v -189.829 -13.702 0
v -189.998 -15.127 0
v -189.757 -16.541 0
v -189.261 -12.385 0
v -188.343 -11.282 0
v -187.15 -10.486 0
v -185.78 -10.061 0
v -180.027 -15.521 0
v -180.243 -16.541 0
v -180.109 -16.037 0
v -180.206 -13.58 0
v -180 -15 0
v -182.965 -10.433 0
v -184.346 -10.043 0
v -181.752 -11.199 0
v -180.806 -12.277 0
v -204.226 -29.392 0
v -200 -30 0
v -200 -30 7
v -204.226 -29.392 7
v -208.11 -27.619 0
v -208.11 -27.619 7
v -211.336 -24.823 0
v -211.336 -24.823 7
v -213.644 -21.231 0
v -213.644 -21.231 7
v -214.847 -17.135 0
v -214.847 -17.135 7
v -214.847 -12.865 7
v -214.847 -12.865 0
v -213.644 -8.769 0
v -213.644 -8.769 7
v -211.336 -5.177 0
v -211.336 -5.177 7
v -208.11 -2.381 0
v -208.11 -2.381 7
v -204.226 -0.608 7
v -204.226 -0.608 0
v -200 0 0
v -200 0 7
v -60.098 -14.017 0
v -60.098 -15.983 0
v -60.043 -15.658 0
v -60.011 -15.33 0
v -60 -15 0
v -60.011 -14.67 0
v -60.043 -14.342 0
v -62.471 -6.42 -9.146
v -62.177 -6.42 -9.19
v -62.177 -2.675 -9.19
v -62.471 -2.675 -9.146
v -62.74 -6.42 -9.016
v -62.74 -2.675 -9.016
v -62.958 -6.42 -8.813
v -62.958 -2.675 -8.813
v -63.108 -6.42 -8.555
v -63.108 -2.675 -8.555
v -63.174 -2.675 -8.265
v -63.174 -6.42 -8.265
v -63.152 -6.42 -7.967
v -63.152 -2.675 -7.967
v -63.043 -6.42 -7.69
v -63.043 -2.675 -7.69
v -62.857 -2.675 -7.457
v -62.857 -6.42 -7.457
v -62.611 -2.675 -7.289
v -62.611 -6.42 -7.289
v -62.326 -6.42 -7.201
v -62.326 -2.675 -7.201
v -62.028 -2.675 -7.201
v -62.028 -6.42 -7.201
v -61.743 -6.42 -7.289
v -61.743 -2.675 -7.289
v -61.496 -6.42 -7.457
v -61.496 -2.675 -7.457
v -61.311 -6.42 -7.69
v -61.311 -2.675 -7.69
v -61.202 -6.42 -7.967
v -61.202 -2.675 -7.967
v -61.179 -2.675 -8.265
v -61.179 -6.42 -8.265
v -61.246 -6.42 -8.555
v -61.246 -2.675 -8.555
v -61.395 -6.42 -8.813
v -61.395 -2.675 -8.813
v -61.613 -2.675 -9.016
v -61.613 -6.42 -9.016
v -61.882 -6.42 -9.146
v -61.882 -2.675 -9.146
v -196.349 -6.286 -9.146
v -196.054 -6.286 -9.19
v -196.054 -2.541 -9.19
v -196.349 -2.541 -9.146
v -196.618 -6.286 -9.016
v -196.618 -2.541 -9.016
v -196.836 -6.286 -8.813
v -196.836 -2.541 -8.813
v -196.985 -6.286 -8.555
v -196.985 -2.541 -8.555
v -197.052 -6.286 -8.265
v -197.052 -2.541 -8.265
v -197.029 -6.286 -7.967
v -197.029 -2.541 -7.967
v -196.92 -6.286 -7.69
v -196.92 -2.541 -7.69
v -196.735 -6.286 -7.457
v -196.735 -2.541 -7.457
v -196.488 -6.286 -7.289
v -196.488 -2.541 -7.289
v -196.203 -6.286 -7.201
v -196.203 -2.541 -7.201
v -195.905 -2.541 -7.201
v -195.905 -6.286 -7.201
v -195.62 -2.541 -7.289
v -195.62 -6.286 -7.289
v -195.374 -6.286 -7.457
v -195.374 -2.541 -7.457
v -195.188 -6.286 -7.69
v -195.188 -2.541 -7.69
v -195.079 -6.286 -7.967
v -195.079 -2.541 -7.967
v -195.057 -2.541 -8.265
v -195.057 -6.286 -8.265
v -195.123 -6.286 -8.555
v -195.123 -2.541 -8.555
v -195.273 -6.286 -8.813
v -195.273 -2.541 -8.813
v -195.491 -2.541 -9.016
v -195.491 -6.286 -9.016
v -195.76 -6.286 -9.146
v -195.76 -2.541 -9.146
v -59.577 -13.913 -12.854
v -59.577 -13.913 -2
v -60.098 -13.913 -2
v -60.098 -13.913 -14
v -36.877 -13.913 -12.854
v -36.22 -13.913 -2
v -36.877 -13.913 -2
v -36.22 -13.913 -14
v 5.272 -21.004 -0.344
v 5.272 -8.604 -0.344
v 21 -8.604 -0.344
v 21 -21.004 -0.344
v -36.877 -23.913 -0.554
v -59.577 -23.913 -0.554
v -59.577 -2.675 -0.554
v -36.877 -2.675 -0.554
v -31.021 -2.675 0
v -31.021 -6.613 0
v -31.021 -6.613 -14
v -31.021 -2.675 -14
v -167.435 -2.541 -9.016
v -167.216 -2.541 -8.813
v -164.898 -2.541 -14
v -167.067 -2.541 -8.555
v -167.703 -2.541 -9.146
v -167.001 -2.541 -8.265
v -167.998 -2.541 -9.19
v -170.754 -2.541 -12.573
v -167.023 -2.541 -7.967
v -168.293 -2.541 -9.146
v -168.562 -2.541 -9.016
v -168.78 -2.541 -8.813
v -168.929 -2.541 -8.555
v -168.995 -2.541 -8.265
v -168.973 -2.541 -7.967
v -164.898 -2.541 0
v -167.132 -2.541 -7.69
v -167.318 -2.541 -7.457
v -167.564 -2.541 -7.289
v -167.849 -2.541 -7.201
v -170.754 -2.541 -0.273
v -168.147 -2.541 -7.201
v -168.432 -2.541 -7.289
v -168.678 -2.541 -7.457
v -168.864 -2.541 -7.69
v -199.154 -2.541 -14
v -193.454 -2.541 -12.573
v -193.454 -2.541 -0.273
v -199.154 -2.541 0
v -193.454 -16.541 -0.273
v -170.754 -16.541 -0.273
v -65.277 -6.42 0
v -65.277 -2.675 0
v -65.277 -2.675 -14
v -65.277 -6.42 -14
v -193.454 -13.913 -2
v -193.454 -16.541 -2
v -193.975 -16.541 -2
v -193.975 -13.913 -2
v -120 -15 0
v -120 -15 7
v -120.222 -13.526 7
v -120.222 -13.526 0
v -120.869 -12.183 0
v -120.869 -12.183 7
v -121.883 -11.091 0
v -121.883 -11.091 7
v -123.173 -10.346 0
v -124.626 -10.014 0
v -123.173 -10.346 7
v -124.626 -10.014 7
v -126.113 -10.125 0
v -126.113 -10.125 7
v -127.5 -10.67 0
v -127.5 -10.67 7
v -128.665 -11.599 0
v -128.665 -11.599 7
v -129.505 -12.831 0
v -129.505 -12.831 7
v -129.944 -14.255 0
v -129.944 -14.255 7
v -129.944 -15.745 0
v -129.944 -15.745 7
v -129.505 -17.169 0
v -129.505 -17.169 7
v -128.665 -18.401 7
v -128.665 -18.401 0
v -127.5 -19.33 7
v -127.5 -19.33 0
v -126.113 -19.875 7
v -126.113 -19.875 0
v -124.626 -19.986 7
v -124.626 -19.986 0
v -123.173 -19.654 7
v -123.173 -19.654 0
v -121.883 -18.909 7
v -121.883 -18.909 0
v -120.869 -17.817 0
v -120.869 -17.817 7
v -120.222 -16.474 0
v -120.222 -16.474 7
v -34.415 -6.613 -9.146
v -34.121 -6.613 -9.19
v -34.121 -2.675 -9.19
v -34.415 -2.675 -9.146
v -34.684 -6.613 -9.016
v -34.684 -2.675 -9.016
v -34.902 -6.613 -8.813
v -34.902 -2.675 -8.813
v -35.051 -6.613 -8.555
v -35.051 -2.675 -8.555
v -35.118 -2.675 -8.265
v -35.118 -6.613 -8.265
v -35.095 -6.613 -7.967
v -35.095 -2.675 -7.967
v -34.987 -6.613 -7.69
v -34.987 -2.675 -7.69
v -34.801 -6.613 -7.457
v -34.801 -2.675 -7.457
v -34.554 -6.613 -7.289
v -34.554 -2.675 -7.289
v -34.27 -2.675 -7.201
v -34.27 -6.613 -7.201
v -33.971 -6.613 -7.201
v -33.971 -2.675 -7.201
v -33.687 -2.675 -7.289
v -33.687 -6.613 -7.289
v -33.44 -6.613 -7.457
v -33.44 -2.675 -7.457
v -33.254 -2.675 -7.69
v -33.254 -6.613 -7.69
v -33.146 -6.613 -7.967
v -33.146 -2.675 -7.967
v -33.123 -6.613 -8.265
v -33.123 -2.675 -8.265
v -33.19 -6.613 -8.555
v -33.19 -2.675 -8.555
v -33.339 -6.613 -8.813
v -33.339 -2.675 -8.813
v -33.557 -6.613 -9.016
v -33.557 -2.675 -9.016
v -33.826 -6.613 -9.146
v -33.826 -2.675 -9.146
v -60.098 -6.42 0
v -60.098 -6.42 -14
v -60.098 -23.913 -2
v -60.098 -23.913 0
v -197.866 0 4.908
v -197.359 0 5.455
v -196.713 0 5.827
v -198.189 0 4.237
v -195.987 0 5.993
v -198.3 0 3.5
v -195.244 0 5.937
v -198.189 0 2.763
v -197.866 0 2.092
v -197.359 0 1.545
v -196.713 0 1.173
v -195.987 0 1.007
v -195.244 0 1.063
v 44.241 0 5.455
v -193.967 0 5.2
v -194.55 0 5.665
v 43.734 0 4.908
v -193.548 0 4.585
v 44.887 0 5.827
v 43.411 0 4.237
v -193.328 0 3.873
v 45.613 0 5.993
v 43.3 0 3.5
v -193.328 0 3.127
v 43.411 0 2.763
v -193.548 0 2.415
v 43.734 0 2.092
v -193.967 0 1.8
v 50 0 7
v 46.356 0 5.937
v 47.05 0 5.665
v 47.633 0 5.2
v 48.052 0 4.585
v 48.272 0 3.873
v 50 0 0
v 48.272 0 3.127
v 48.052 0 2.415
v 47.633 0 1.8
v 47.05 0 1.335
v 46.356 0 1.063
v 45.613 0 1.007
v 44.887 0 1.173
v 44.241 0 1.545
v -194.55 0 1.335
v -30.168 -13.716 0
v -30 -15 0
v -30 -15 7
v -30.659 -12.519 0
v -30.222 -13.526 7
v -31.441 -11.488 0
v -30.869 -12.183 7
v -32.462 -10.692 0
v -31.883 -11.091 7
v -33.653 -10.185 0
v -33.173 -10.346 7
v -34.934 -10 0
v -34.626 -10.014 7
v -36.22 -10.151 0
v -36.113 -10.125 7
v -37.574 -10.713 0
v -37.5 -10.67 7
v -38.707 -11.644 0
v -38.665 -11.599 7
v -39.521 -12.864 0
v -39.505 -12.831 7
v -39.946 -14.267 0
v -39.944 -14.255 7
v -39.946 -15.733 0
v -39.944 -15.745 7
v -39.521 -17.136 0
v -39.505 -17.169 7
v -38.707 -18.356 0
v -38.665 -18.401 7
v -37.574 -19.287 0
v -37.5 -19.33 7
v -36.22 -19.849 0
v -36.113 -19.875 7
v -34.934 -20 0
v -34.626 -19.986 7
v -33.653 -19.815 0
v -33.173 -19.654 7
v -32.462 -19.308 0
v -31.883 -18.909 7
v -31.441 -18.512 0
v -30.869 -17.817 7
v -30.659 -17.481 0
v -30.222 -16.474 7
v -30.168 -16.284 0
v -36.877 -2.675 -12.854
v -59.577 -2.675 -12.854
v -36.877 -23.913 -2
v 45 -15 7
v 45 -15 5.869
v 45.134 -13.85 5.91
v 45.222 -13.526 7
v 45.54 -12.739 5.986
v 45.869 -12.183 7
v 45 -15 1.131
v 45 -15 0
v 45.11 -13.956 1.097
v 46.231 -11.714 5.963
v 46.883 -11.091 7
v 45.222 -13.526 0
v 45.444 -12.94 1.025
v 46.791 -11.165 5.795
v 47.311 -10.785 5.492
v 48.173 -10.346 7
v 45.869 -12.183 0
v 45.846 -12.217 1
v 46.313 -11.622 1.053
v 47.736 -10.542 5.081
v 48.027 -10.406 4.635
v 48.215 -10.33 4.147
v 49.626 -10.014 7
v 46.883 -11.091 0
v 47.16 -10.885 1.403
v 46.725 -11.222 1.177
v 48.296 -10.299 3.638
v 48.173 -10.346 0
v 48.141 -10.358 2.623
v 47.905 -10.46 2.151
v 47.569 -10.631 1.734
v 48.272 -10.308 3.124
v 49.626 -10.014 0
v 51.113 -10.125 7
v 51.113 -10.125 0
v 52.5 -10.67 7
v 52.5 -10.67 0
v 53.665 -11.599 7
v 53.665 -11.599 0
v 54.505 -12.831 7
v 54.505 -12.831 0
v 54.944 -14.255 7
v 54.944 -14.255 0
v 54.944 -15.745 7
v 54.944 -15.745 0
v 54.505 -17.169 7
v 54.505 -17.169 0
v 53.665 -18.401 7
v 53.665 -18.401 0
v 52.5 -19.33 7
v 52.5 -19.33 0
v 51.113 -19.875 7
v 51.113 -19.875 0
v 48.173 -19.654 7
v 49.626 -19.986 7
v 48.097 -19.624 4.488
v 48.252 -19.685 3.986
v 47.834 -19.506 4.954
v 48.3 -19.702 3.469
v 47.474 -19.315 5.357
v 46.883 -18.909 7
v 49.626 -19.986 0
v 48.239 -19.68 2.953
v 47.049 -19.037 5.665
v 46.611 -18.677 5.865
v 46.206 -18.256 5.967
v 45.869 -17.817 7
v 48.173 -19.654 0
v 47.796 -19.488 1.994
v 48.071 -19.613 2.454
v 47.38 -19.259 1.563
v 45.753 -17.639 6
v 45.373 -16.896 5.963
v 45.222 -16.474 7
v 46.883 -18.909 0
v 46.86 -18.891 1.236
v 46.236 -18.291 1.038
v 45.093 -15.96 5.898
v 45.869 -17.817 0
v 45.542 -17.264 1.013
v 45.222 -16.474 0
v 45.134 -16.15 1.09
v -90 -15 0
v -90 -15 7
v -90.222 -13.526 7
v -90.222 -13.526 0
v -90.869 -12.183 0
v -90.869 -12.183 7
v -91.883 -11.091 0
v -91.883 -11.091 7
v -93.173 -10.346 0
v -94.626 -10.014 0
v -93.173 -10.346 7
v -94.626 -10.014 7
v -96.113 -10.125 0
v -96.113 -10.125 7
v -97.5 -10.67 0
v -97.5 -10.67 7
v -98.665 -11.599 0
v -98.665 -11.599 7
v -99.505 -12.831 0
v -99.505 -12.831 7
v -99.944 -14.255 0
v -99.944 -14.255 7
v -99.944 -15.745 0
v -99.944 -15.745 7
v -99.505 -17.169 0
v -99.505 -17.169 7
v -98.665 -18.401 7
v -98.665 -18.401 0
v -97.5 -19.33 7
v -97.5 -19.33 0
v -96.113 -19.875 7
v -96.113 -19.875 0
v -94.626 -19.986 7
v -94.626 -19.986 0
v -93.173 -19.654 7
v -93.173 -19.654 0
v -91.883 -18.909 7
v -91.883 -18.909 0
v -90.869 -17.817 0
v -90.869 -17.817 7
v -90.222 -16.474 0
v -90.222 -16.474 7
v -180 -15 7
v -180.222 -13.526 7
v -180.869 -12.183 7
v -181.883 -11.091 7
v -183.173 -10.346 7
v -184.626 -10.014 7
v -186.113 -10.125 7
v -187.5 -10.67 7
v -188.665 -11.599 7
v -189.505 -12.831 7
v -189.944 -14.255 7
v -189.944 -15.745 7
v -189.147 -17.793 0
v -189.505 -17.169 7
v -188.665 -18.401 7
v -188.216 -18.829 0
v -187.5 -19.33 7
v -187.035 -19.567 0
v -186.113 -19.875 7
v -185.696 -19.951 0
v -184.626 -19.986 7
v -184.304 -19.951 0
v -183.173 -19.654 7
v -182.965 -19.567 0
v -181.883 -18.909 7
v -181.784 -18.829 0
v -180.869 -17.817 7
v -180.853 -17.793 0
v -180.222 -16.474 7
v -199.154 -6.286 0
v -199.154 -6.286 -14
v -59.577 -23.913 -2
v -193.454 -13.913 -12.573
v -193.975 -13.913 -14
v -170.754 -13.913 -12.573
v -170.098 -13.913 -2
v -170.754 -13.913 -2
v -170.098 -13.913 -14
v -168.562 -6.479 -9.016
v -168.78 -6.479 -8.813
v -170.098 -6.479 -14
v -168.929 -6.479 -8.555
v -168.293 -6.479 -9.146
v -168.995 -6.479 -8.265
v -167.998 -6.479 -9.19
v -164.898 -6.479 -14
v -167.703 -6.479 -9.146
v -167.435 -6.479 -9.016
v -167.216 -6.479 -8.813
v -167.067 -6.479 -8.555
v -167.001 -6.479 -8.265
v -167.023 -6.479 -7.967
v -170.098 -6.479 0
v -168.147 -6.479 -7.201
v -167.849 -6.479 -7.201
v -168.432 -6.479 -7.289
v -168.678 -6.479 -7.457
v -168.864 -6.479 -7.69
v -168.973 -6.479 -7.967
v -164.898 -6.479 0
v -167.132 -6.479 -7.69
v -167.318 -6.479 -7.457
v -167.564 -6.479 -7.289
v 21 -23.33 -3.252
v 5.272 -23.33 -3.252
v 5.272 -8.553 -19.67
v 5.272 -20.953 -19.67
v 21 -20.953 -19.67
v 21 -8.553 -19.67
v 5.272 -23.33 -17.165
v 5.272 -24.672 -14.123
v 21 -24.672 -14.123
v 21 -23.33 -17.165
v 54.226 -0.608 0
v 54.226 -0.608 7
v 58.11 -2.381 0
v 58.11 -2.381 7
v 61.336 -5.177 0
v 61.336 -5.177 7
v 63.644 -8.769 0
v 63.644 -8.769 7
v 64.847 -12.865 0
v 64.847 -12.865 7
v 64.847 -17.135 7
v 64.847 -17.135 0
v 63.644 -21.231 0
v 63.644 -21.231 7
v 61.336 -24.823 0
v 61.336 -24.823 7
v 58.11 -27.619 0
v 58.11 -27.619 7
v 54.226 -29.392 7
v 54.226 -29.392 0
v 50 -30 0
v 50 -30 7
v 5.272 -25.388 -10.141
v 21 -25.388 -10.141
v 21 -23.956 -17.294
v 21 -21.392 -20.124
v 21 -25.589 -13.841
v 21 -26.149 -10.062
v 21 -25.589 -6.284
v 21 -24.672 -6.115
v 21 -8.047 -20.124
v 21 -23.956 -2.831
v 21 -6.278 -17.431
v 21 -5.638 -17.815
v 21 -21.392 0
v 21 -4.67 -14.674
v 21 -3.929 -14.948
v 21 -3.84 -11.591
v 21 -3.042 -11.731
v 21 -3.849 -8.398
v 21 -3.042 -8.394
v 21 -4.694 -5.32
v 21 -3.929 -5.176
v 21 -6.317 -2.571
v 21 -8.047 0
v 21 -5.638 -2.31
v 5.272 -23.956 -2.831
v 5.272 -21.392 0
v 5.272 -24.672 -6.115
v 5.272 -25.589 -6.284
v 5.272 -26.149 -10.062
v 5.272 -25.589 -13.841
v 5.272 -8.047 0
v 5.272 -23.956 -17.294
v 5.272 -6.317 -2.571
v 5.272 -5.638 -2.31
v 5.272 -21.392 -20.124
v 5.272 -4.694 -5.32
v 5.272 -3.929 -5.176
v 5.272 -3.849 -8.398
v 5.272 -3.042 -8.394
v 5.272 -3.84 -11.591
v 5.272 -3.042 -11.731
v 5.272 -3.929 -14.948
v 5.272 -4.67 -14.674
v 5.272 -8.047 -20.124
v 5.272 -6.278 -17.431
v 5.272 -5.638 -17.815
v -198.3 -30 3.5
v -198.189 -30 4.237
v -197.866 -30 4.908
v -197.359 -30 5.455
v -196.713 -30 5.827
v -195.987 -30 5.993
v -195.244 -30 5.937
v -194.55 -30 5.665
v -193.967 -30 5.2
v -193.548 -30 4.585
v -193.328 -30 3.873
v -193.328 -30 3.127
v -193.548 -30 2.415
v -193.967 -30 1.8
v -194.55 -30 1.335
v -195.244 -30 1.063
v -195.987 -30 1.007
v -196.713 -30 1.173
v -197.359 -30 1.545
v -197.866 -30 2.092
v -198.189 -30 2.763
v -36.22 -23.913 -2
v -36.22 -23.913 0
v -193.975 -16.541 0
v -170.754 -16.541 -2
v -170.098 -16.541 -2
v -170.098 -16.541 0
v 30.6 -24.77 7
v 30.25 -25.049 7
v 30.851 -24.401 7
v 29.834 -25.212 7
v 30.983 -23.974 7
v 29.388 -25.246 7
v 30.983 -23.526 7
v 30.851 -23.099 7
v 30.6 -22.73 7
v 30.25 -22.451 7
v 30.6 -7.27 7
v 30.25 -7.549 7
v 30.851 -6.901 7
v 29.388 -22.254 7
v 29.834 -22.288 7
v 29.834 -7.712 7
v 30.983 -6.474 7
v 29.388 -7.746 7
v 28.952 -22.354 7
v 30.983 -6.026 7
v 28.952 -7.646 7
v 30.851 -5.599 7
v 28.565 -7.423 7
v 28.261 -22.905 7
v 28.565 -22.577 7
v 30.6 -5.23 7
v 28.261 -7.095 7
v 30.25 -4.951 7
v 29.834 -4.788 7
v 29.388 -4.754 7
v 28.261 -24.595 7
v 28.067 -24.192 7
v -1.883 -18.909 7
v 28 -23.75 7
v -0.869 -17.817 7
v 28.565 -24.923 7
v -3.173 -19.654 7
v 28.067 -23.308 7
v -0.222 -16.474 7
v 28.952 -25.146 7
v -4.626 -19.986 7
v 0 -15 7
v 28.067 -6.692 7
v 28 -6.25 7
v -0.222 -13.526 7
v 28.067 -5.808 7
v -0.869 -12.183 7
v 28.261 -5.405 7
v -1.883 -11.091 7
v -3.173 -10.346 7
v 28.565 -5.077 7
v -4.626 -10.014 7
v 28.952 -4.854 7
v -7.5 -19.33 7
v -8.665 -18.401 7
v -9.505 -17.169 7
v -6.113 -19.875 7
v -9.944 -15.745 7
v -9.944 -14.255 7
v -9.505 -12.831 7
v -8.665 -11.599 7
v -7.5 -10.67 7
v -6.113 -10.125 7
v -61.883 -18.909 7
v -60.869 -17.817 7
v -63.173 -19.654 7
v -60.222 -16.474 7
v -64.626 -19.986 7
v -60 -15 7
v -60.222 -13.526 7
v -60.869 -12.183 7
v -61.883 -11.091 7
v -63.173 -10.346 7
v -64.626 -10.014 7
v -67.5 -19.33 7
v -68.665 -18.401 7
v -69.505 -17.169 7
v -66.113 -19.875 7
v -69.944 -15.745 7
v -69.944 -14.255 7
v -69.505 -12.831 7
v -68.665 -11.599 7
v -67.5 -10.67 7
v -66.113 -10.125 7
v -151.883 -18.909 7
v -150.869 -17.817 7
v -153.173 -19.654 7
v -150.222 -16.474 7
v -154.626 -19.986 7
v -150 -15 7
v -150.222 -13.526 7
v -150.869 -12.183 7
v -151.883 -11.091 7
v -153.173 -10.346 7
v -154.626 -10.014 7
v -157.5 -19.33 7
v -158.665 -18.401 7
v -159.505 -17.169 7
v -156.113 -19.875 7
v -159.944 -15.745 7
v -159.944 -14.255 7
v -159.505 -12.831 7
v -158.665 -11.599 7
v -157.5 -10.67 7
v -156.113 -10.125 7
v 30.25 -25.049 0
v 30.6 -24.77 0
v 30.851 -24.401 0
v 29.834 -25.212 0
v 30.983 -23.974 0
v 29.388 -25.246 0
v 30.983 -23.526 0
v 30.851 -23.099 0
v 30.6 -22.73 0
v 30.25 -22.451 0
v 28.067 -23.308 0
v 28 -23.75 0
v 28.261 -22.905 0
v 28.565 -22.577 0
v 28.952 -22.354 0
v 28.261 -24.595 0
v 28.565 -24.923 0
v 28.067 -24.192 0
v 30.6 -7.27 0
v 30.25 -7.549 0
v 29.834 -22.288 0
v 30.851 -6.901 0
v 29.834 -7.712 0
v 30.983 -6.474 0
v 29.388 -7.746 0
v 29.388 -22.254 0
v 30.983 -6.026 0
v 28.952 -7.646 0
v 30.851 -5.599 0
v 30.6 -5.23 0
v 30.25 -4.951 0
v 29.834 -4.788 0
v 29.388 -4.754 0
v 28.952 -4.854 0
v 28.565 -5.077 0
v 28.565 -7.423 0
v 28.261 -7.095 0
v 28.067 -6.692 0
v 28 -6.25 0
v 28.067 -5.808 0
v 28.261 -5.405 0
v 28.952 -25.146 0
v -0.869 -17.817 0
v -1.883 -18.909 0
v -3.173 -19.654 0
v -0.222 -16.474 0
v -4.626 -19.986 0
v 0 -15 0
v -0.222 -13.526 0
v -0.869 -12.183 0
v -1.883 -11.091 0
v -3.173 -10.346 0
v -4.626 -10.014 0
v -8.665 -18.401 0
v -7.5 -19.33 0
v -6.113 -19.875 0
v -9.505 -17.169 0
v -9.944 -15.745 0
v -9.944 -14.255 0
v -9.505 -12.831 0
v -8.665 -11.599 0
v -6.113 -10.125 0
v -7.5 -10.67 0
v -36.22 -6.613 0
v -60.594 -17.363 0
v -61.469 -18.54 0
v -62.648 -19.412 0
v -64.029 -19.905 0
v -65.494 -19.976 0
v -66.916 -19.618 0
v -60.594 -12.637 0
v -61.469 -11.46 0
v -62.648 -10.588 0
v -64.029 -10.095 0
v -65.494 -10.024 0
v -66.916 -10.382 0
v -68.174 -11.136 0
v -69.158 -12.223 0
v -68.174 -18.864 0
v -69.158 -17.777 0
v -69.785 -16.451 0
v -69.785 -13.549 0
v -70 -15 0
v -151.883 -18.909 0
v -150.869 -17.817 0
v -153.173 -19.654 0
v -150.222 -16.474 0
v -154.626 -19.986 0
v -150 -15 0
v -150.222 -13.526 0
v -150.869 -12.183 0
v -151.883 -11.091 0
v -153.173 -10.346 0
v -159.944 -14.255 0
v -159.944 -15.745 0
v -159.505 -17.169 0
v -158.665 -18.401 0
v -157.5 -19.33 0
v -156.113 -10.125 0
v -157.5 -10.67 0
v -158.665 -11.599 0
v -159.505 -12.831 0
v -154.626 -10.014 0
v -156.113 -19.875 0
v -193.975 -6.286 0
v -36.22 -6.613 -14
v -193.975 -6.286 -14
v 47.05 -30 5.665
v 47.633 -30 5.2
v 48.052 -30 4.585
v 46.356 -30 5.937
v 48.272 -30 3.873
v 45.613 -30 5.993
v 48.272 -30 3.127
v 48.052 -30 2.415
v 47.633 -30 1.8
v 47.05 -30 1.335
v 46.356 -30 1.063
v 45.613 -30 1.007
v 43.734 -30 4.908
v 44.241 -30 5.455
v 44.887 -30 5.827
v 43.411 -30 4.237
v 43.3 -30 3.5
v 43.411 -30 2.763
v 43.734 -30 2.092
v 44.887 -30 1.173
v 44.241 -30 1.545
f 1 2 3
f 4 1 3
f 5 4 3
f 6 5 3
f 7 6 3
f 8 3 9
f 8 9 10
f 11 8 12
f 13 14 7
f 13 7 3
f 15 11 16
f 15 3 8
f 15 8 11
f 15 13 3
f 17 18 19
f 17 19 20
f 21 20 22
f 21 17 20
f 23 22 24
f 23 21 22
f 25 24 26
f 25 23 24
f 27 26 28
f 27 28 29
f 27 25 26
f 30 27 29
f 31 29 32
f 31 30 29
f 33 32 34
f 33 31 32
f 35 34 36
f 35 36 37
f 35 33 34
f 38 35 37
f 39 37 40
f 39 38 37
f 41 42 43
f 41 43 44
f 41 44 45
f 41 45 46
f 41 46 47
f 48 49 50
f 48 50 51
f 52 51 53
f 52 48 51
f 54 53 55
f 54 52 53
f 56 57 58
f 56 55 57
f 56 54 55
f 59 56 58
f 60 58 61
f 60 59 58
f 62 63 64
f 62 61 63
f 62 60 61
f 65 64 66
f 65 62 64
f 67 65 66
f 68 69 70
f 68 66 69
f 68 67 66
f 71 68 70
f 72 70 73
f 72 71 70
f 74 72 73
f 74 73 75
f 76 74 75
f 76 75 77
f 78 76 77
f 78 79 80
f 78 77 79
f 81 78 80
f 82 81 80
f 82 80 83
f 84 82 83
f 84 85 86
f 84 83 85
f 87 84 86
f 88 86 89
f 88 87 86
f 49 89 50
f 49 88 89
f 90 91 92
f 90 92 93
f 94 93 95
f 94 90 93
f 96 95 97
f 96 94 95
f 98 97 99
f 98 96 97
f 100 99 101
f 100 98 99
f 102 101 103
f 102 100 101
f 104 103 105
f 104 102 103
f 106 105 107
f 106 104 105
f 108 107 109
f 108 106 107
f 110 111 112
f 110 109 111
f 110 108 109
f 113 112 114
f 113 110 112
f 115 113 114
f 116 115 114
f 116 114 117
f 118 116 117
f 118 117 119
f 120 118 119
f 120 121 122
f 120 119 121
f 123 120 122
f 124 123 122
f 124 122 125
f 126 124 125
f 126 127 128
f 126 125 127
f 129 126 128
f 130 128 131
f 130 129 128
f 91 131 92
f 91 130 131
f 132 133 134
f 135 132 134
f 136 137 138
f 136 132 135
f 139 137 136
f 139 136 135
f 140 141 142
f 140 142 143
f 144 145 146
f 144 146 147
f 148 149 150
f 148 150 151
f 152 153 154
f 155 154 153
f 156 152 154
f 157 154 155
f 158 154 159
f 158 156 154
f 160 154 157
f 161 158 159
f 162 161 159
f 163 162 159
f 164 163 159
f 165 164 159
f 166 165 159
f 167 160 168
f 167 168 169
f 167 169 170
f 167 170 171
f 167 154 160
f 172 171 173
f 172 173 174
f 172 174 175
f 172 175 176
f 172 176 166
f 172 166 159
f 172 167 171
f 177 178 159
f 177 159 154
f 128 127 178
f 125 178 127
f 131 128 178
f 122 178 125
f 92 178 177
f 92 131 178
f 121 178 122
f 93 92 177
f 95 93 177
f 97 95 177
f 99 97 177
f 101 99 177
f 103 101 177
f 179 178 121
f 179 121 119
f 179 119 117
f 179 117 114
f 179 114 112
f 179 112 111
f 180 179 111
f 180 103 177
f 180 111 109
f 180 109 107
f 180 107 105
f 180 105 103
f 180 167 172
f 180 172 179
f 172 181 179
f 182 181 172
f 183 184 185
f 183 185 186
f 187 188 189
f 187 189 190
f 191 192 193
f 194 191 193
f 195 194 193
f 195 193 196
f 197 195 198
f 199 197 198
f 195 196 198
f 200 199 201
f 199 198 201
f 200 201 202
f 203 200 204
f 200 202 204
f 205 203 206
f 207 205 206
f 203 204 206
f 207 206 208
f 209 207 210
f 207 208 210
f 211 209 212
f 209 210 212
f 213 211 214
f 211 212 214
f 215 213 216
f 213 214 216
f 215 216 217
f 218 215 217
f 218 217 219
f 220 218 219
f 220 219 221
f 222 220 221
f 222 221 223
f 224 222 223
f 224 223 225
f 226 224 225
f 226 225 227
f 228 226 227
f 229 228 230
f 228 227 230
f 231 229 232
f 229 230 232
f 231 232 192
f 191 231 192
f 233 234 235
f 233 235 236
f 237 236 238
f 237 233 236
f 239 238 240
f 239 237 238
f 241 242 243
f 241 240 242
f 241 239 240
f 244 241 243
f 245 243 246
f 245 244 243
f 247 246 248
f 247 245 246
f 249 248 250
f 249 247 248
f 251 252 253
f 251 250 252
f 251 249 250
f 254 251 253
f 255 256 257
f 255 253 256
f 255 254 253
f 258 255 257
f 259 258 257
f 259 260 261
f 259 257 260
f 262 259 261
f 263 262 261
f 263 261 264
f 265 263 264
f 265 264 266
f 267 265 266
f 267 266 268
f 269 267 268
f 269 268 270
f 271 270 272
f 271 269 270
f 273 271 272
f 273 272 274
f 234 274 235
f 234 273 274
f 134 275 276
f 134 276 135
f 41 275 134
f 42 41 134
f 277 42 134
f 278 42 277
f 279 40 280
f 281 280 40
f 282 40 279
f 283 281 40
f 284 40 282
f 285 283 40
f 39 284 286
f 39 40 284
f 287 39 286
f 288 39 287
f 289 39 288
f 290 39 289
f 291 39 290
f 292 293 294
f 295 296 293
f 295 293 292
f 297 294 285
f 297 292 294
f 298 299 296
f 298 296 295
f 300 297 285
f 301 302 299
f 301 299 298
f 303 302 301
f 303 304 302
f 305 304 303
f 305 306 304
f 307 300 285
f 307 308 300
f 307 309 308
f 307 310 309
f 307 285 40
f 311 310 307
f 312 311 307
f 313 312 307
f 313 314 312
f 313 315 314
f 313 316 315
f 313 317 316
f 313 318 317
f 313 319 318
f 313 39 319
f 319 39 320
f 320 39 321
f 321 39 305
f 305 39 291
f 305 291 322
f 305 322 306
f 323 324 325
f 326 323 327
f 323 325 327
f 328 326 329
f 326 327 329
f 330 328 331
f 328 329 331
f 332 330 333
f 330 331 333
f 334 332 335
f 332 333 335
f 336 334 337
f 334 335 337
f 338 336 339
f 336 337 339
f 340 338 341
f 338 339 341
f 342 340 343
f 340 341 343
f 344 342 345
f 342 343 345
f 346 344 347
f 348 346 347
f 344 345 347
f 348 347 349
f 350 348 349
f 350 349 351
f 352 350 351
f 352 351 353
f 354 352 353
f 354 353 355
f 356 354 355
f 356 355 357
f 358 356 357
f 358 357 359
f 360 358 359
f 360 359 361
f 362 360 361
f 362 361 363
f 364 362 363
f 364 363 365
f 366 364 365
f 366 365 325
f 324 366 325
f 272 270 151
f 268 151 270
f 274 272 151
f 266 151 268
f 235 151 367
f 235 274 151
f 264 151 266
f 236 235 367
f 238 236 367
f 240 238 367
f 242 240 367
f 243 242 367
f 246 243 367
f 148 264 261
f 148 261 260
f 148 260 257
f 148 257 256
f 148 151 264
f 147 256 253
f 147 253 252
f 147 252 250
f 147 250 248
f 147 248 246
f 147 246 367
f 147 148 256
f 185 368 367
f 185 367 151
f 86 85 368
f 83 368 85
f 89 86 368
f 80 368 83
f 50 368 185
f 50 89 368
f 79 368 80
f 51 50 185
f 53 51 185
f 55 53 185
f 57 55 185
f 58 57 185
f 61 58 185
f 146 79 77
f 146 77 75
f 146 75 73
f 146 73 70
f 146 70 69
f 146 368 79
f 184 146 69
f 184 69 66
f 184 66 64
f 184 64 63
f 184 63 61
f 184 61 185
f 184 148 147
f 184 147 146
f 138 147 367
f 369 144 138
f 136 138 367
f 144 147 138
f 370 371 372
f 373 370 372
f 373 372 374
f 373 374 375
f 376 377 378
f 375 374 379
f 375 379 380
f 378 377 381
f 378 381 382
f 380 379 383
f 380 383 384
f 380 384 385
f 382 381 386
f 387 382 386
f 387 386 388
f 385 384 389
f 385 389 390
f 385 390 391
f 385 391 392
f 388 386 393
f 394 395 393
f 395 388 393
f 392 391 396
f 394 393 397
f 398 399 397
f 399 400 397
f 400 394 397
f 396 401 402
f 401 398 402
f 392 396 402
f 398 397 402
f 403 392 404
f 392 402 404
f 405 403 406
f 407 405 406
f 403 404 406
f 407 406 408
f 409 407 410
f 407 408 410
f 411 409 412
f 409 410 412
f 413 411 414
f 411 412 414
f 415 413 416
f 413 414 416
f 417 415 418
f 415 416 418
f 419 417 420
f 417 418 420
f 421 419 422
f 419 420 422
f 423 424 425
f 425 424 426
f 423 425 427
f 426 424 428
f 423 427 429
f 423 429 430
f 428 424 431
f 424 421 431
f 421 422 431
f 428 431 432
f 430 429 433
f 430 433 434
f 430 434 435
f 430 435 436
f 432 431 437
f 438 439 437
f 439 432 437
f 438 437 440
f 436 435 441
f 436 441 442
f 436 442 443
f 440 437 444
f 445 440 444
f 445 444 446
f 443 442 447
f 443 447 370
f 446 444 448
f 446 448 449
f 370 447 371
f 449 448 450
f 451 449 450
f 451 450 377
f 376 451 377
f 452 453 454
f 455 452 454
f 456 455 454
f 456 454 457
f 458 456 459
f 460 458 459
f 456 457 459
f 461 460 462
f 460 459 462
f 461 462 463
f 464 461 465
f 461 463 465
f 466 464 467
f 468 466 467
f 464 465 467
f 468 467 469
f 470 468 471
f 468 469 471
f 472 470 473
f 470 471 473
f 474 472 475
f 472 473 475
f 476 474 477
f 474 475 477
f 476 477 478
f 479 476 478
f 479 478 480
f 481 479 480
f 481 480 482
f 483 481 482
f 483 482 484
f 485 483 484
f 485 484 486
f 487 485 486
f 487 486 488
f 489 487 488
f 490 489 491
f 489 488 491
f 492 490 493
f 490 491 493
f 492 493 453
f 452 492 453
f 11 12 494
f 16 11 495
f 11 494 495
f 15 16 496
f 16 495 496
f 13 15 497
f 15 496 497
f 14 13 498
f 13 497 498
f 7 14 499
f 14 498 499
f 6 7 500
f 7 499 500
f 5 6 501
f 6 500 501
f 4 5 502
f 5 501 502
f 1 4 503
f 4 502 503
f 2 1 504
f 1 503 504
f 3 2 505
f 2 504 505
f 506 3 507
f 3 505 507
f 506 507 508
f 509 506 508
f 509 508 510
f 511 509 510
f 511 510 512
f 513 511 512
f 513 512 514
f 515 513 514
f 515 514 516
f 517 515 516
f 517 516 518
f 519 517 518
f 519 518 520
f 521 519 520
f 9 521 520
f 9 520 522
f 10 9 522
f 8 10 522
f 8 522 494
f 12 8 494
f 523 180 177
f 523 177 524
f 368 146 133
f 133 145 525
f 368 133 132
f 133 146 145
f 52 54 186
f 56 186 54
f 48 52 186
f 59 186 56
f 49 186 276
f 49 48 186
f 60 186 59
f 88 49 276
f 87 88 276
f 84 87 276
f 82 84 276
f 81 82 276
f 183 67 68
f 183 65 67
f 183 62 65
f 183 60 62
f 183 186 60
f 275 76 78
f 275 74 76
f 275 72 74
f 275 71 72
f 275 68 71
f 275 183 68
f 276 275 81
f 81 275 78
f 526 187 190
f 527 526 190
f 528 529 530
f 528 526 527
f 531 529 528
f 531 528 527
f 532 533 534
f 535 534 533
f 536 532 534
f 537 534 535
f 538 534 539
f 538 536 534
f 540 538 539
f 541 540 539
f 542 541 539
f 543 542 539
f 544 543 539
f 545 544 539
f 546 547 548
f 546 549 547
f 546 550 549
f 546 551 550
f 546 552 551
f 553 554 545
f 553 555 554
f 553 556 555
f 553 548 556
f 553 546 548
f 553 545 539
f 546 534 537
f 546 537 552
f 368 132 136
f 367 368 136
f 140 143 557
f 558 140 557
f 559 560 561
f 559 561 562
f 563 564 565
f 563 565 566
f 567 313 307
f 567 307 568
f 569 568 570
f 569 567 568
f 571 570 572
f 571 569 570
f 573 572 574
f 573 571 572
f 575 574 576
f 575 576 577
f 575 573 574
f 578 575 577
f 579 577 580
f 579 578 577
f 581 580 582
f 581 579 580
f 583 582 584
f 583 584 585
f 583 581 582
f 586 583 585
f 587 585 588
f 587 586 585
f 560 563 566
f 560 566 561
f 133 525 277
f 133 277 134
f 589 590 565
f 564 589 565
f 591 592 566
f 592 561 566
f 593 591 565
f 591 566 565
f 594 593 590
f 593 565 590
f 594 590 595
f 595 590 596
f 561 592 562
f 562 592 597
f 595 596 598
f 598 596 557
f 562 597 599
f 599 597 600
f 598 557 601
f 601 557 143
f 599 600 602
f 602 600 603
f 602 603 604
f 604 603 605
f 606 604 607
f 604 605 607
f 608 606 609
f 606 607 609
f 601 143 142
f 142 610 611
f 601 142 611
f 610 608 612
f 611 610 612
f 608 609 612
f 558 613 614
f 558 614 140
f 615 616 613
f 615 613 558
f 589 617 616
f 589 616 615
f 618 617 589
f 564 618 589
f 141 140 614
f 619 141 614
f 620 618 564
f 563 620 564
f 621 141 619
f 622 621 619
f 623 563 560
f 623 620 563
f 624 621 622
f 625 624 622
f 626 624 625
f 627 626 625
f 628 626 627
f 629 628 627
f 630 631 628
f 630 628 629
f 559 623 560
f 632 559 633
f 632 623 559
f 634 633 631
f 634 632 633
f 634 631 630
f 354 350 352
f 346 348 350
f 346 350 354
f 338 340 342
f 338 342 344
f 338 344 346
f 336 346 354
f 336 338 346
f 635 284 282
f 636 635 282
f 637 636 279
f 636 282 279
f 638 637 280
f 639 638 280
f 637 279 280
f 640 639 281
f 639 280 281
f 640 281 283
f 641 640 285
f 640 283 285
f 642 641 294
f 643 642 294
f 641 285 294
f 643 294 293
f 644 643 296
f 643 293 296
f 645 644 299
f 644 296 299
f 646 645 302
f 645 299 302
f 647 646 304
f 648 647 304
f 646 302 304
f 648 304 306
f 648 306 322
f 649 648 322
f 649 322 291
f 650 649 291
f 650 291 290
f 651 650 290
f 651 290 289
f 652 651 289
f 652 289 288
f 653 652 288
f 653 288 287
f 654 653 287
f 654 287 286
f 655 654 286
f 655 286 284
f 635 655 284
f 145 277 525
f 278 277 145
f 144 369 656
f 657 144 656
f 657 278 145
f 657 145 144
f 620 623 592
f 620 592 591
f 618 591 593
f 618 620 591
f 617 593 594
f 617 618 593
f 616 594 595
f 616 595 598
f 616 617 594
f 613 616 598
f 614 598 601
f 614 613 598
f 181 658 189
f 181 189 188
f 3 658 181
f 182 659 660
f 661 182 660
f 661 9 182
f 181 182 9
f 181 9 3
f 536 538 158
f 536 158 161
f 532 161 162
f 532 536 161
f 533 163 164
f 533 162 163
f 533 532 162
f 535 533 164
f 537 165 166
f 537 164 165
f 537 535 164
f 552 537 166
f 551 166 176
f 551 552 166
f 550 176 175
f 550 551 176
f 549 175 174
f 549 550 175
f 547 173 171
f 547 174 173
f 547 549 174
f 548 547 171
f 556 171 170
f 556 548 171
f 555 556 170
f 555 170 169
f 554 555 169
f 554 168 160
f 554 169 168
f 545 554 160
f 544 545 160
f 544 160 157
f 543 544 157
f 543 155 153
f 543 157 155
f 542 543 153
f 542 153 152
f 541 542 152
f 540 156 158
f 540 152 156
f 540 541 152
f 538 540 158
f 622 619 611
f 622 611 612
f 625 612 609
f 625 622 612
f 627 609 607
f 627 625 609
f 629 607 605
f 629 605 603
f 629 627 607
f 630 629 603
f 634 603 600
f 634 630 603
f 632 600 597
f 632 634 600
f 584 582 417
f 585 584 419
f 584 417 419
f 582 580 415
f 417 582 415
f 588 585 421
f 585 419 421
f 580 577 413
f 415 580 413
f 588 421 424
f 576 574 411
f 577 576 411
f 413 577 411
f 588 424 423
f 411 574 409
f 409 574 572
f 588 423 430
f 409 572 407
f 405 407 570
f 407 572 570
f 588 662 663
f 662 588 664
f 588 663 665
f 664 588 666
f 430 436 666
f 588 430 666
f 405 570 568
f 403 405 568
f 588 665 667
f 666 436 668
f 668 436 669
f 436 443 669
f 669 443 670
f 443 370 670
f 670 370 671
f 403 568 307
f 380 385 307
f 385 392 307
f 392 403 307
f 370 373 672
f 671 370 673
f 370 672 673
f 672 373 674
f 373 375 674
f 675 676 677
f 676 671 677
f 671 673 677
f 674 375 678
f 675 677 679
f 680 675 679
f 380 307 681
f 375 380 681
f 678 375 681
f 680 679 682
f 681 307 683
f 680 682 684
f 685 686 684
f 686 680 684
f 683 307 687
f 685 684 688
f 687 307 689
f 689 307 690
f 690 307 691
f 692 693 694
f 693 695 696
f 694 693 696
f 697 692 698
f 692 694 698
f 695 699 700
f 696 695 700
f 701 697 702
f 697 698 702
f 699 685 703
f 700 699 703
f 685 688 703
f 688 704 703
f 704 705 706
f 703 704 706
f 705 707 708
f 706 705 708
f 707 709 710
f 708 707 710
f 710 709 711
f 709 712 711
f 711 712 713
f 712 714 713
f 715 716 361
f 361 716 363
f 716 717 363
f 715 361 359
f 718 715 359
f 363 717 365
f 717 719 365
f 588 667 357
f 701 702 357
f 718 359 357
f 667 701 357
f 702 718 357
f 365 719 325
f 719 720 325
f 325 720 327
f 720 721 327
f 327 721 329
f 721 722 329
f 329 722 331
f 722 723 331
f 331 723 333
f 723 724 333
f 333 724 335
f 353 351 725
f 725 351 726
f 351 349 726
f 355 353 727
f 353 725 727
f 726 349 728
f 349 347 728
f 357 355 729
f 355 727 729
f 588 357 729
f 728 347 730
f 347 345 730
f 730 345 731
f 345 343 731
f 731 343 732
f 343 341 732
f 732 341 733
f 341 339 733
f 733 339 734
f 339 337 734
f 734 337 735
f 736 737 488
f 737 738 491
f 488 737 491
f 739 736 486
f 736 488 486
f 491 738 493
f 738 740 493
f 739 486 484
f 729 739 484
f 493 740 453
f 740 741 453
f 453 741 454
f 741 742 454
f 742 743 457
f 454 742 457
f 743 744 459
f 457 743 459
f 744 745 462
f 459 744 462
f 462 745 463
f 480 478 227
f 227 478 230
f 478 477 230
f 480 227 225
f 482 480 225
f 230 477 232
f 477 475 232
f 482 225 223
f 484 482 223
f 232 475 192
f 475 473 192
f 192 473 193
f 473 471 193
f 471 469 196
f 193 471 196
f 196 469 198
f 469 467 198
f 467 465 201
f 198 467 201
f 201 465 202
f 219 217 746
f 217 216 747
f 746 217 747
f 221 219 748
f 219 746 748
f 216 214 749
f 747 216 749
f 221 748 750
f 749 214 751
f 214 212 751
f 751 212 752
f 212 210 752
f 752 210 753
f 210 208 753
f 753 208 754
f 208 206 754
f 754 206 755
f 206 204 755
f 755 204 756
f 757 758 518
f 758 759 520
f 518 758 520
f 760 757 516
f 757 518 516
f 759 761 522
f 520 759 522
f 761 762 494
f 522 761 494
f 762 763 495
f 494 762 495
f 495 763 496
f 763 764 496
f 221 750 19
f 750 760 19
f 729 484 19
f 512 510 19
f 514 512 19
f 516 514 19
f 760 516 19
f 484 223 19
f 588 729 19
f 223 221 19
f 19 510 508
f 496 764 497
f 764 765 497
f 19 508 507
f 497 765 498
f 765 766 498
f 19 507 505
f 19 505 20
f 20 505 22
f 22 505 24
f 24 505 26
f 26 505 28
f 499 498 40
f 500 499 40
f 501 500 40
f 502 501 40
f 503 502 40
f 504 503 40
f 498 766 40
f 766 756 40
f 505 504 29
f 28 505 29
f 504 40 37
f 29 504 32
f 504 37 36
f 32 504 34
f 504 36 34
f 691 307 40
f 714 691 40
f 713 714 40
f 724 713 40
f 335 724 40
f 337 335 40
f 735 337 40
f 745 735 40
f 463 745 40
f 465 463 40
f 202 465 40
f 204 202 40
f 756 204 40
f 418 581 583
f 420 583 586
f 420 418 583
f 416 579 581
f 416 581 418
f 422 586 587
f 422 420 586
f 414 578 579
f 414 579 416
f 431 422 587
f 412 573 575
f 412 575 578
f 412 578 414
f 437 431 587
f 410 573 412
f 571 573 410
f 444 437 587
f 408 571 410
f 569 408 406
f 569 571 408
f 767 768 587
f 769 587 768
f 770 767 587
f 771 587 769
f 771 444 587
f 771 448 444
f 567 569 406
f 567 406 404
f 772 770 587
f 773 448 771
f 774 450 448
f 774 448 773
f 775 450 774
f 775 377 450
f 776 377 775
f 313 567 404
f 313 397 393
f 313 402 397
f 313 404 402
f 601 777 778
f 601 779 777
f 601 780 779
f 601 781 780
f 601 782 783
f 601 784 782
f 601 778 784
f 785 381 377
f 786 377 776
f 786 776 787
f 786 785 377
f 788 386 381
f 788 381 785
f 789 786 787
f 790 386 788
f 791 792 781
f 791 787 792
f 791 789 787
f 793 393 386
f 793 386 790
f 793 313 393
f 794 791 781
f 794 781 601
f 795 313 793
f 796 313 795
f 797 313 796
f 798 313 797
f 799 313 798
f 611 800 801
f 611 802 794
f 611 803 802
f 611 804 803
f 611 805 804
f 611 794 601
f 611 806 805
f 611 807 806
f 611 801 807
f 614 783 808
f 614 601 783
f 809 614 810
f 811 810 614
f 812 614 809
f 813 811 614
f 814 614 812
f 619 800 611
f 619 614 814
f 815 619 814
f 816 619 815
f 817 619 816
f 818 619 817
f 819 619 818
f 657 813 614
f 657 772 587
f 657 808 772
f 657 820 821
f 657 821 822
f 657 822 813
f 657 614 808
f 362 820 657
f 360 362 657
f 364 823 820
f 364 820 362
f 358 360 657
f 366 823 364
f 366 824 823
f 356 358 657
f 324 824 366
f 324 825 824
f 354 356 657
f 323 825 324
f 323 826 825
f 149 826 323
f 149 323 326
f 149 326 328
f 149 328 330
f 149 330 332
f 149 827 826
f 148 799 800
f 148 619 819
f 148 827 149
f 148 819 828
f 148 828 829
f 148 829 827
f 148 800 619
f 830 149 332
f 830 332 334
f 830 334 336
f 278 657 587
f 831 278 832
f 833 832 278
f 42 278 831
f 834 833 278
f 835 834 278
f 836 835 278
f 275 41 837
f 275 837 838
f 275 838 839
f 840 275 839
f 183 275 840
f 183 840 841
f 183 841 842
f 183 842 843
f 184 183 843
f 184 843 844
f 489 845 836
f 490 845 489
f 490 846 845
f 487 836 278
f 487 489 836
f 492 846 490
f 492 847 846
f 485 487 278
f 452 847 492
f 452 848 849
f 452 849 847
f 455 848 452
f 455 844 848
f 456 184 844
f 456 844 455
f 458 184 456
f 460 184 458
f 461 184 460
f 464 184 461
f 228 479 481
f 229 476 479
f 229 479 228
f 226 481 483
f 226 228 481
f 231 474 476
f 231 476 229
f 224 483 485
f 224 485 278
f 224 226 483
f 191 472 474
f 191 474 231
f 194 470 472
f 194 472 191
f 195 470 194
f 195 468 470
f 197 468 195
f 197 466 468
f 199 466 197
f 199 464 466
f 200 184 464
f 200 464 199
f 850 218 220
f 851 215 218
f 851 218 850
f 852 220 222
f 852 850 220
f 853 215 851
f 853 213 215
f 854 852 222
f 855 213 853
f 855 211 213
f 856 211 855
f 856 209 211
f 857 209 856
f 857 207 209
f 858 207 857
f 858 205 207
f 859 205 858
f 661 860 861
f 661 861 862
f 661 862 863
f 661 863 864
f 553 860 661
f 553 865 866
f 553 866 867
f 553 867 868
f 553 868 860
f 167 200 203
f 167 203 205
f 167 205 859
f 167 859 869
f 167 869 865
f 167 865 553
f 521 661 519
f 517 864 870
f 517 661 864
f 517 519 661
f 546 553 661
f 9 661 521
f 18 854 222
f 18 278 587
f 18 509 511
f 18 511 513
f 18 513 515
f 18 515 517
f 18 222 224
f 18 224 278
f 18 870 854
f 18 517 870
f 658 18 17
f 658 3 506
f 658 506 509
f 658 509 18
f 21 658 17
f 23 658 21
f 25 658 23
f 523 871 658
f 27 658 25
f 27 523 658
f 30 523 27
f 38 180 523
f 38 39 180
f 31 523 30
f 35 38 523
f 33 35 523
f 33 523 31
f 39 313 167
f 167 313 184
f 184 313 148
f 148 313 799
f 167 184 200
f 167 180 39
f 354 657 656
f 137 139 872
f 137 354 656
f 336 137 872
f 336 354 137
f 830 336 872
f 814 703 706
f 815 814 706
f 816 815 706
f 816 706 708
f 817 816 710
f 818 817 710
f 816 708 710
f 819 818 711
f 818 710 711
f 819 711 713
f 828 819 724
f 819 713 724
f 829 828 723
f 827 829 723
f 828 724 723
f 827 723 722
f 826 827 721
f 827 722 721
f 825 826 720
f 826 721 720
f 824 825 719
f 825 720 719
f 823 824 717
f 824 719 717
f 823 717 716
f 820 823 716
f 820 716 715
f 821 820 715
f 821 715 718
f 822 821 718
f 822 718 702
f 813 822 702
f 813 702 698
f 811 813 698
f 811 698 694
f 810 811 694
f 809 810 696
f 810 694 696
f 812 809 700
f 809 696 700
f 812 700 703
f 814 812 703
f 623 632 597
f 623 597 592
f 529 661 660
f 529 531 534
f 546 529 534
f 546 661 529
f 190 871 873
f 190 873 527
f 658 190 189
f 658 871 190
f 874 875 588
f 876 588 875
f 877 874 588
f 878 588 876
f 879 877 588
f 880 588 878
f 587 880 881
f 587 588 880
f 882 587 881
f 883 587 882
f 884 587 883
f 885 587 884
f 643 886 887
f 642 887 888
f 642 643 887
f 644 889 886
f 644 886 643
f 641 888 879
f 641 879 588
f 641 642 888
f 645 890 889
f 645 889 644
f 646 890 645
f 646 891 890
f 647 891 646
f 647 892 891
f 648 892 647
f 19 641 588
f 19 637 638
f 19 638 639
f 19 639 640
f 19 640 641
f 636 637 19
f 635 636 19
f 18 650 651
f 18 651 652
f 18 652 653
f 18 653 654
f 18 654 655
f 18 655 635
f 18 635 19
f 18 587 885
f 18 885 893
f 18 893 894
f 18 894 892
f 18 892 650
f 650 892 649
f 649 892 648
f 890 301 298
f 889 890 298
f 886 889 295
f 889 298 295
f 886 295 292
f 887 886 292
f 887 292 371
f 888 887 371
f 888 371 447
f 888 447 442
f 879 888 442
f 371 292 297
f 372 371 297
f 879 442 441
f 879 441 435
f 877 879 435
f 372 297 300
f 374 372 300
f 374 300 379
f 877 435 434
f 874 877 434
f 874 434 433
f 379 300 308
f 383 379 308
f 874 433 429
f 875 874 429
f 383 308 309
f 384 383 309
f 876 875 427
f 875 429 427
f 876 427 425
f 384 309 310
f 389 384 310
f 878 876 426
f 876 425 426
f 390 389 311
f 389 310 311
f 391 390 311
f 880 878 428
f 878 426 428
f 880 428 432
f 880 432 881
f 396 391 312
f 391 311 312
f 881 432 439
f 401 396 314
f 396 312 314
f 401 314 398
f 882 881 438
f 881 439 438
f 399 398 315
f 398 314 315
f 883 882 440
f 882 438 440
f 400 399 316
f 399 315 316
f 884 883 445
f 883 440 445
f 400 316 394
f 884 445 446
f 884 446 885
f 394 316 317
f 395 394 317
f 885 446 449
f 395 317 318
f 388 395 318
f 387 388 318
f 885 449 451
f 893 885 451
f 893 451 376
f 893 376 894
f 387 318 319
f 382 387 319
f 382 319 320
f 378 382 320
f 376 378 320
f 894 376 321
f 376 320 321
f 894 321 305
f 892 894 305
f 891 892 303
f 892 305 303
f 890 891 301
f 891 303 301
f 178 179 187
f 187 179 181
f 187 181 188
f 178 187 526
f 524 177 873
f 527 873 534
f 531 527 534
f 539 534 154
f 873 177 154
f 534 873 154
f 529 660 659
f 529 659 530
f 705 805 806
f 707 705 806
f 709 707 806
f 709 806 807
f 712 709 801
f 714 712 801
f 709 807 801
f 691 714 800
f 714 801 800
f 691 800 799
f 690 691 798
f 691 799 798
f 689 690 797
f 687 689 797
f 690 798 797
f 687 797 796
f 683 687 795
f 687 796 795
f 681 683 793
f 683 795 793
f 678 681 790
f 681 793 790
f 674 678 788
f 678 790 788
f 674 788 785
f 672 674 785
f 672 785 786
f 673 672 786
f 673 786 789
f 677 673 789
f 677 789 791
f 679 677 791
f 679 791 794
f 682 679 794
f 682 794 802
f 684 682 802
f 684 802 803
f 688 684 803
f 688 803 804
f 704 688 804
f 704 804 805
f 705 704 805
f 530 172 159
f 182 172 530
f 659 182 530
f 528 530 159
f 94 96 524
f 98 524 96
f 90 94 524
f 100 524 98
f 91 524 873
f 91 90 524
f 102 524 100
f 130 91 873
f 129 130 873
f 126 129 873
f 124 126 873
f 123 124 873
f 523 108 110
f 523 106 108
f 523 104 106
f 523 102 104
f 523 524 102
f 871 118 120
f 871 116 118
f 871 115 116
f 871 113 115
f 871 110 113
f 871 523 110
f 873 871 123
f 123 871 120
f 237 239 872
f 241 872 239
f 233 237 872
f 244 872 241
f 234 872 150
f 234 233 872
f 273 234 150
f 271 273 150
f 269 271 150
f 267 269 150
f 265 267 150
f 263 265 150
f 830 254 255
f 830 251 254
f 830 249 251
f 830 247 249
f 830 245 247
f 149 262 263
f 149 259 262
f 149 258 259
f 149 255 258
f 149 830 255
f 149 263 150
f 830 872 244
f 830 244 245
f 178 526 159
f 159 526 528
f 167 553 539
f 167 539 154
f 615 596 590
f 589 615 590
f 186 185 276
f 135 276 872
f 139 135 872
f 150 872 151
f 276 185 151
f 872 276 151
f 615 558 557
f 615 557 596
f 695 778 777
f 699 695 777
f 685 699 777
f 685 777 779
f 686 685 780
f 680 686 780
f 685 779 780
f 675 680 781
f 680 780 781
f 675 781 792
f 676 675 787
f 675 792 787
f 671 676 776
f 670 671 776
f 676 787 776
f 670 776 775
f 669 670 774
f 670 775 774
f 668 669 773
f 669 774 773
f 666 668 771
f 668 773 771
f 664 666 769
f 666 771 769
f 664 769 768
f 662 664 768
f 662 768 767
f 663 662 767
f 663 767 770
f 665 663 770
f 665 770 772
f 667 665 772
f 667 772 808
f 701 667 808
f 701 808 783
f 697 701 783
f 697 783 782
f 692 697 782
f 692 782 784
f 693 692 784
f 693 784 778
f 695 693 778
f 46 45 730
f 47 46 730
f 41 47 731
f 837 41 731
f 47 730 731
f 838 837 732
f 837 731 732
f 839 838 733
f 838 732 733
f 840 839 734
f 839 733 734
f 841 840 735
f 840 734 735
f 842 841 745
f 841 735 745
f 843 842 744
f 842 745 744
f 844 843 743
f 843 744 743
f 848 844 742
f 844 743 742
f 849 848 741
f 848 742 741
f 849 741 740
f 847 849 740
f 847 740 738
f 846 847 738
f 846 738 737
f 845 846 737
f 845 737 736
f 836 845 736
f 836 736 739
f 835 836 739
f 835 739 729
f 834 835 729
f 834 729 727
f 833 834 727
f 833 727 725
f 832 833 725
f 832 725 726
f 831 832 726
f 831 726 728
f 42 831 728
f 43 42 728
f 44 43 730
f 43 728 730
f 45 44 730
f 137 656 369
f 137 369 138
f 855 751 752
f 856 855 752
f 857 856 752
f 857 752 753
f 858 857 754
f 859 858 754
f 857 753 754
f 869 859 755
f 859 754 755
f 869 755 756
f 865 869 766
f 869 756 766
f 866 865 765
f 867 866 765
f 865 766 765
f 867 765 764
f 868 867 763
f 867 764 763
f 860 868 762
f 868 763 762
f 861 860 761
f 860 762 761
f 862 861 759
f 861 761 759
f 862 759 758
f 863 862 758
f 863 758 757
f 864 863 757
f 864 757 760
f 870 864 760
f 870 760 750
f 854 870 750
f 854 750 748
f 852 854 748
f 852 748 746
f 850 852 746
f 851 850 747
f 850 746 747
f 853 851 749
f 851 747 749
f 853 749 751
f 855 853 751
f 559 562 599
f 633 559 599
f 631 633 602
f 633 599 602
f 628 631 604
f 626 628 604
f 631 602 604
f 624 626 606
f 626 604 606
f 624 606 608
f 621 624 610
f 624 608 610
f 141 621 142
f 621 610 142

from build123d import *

# Parameters (mm, degrees)
BOSS_EXTRUDE1_DEPTH     = 7
SKETCH2_R               = 5
CUT_EXTRUDE1_DEPTH      = 7
LPATTERN1_COUNT         = 7
LPATTERN1_PITCH         = 30
SKETCH6_R               = 5
CUT_EXTRUDE2_DEPTH      = 10
BOSS_EXTRUDE2_DEPTH     = 21
CUT_EXTRUDE3_DEPTH      = 21
CUT_EXTRUDE4_REACH      = 220.014
SKETCH9_R               = 1.5
CUT_EXTRUDE5_REACH      = 220.771
SKETCH10_W              = 5.271518542
SKETCH10_H              = 23.219312301
BOSS_EXTRUDE3_DEPTH     = 14
CUT_EXTRUDE6_DEPTH      = 1
CUT_EXTRUDE6_DEPTH_BACK = 22
SKETCH12_W              = 22.7
SKETCH12_H              = 12.3
CUT_EXTRUDE7_DEPTH      = 7
CUT_EXTRUDE7_DEPTH_BACK = 7
SKETCH13_R              = 1
CUT_EXTRUDE8_REACH      = 184.393
SKETCH14_W              = 12
SKETCH14_H              = 10
CUT_EXTRUDE9_REACH      = 220.014
SKETCH15_R              = 2.5


with BuildPart() as part:
    # Sketch1 → Boss-Extrude1 (new body)
    with BuildSketch(Plane.XY):
        with BuildLine():
            Line((-200, 0), (50, 0))
            ThreePointArc((50, 0), (65, -15), (50, -30))
            Line((50, -30), (-200, -30))
            ThreePointArc((-200, -30), (-215, -15), (-200, 0))
        make_face()
    extrude(amount=BOSS_EXTRUDE1_DEPTH)

    # Sketch2 → Cut-Extrude1 (cut)
    with BuildSketch(Plane.XY.offset(7)):
        with Locations((-185, -15)):
            Circle(SKETCH2_R)
    cut_extrude1 = extrude(amount=-CUT_EXTRUDE1_DEPTH, mode=Mode.SUBTRACT)

    # LPattern1: Cut-Extrude1 ×7
    with Locations(*[(i * LPATTERN1_PITCH, 0, 0) for i in range(1, LPATTERN1_COUNT)]):
        add(cut_extrude1, mode=Mode.SUBTRACT)

    # Sketch6 → Cut-Extrude2 (cut)
    with BuildSketch(Plane(origin=(0, 0, 0), x_dir=(-1, 0, 0), z_dir=(0, 0, -1))):
        with Locations((-50, -15)):
            Circle(SKETCH6_R)
    extrude(amount=-CUT_EXTRUDE2_DEPTH, mode=Mode.SUBTRACT)

    # Sketch7 → Boss-Extrude2 (add)
    with BuildSketch(Plane(origin=(0, 0, 0), x_dir=(0, 0, -1), z_dir=(1, 0, 0))):
        with BuildLine():
            Line((20.124409349, -8.046570755), (20.124409349, -21.391782887))
            ThreePointArc((20.124409349, -21.391782887), (10.062204675, -26.149434806), (0, -21.391782887))
            Line((0, -21.391782887), (0, -8.046570755))
            ThreePointArc((0, -8.046570755), (10.062204675, -2.930122505), (20.124409349, -8.046570755))
        make_face()
    extrude(amount=BOSS_EXTRUDE2_DEPTH)

    # Sketch8 → Cut-Extrude3 (cut)
    with BuildSketch(Plane(origin=(21, 0, 0), x_dir=(0, 0, -1), z_dir=(1, 0, 0))):
        with BuildLine():
            Line((0.343653188, -8.603738845), (0.343653188, -21.003738845))
            Line((0.343653188, -21.003738845), (3.251608919, -23.33010343))
            Line((3.251608919, -23.33010343), (6.11482687, -24.672236845))
            Line((6.11482687, -24.672236845), (10.141227113, -25.388041332))
            Line((10.141227113, -25.388041332), (14.122889575, -24.672236845))
            Line((14.122889575, -24.672236845), (17.165058648, -23.33010343))
            Line((17.165058648, -23.33010343), (19.670374355, -20.953281344))
            Line((19.670374355, -20.953281344), (19.670374355, -8.553281344))
            ThreePointArc((19.670374355, -8.553281344), (9.994377841, -3.738573545), (0.343653188, -8.603738845))
        make_face()
    extrude(amount=-CUT_EXTRUDE3_DEPTH, mode=Mode.SUBTRACT)

    # Sketch9 → Cut-Extrude4 (cut, up to next)
    with BuildSketch(Plane(origin=(0, 0, 0), x_dir=(-1, 0, 0), z_dir=(0, 0, -1)), mode=Mode.PRIVATE) as cut_extrude4_sk1:
        with Locations((-29.5, -6.25)):
            Circle(SKETCH9_R)
    cut_extrude4_tool1 = extrude(cut_extrude4_sk1.sketch, amount=-CUT_EXTRUDE4_REACH, mode=Mode.PRIVATE) & part.part
    # Sketch9 → Cut-Extrude4 (cut, up to next)
    with BuildSketch(Plane(origin=(0, 0, 0), x_dir=(-1, 0, 0), z_dir=(0, 0, -1)), mode=Mode.PRIVATE) as cut_extrude4_sk2:
        with Locations((-29.5, -23.75)):
            Circle(SKETCH9_R)
    cut_extrude4_tool2 = extrude(cut_extrude4_sk2.sketch, amount=-CUT_EXTRUDE4_REACH, mode=Mode.PRIVATE) & part.part
    add(cut_extrude4_tool1.solids().sort_by_distance((29.5, -6.25, 0))[0], mode=Mode.SUBTRACT)
    add(cut_extrude4_tool2.solids().sort_by_distance((29.5, -23.75, 0))[0], mode=Mode.SUBTRACT)

    # Cut-Extrude5: up to this face of the body (flat: up to its plane)
    cut_extrude5_end = Plane(part.part.faces().sort_by_distance((-78.33059512, -15.01080435, 0))[0])
    # Sketch10 → Cut-Extrude5 (cut, up to the picked face)
    with BuildSketch(Plane(origin=(0, 0, -20.124409349), x_dir=(-1, 0, 0), z_dir=(0, 0, -1)), mode=Mode.PRIVATE) as cut_extrude5_sk1:
        with Locations((-2.635759271, -14.539778656)):
            Rectangle(SKETCH10_W, SKETCH10_H)
    cut_extrude5_tool1 = split(extrude(cut_extrude5_sk1.sketch, amount=-CUT_EXTRUDE5_REACH, mode=Mode.PRIVATE), bisect_by=cut_extrude5_end, keep=Keep.BOTH, mode=Mode.PRIVATE)
    add(cut_extrude5_tool1.solids().sort_by(Axis((2.635759, -14.539779, -20.124409), (0, 0, 1)))[0], mode=Mode.SUBTRACT)

    # Sketch11 → Boss-Extrude3 (add)
    with BuildSketch(Plane(origin=(0, 0, 0), x_dir=(-1, 0, 0), z_dir=(0, 0, -1))):
        Polygon((60.097644306, -6.420008597), (60.097644306, -23.913431972), (36.21993437, -23.913431972), (36.21993437, -6.613282571), (31.020509523, -6.613282571), (31.020509523, -2.674883318), (65.276628567, -2.674883318), (65.276628567, -6.420008597), align=None)
        Polygon((193.975354243, -6.285954501), (193.975354243, -16.540829221), (170.097644306, -16.540829221), (170.097644306, -6.479228475), (164.898219459, -6.479228475), (164.898219459, -2.540829221), (199.154338504, -2.540829221), (199.154338504, -6.285954501), align=None)
    extrude(amount=BOSS_EXTRUDE3_DEPTH)

    # Sketch12 → Cut-Extrude6 (cut, two sides: drawn at the far end of the back side and taken through both)
    with BuildSketch(Plane(origin=(0, -2.674883318, 0), x_dir=(1, 0, 0), z_dir=(0, 1, 0)).offset(-CUT_EXTRUDE6_DEPTH_BACK)):
        with Locations((-48.226628567, 6.703751831)):
            Rectangle(SKETCH12_W, SKETCH12_H)
        with Locations((-182.104338504, 6.42306456)):
            Rectangle(SKETCH12_W, SKETCH12_H)
    extrude(amount=CUT_EXTRUDE6_DEPTH + CUT_EXTRUDE6_DEPTH_BACK, mode=Mode.SUBTRACT)

    # Sketch13 → Cut-Extrude7 (cut, two sides: drawn at the far end of the back side and taken through both)
    with BuildSketch(Plane(origin=(0, -2.674883318, 0), x_dir=(1, 0, 0), z_dir=(0, 1, 0)).offset(-CUT_EXTRUDE7_DEPTH_BACK)):
        with Locations(Location((-167.998219459, 8.19, 0), (0, 0, 90))):
            Circle(SKETCH13_R)
        with Locations(Location((-196.054338504, 8.19, 0), (0, 0, 90))):
            Circle(SKETCH13_R)
        with Locations(Location((-62.176628567, 8.19, 0), (0, 0, 90))):
            Circle(SKETCH13_R)
        with Locations(Location((-34.120509523, 8.19, 0), (0, 0, 90))):
            Circle(SKETCH13_R)
    extrude(amount=CUT_EXTRUDE7_DEPTH + CUT_EXTRUDE7_DEPTH_BACK, mode=Mode.SUBTRACT)

    # Cut-Extrude8: up to this face of the body (flat: up to its plane)
    cut_extrude8_end = Plane(part.part.faces().sort_by_distance((-193.975354243, -11.413391861, -7))[0])
    # Sketch14 → Cut-Extrude8 (cut, up to the picked face)
    with BuildSketch(Plane(origin=(-36.21993437, 0, 0), x_dir=(0, 0, -1), z_dir=(1, 0, 0)), mode=Mode.PRIVATE) as cut_extrude8_sk1:
        with Locations((8, -18.913431972)):
            Rectangle(SKETCH14_W, SKETCH14_H)
    cut_extrude8_tool1 = split(extrude(cut_extrude8_sk1.sketch, amount=-CUT_EXTRUDE8_REACH, mode=Mode.PRIVATE), bisect_by=cut_extrude8_end, keep=Keep.BOTH, mode=Mode.PRIVATE)
    add(cut_extrude8_tool1.solids().sort_by(Axis((-36.219934, -18.913432, -8), (-1, 0, 0)))[0], mode=Mode.SUBTRACT)

    # Sketch15 → Cut-Extrude9 (cut, up to next)
    with BuildSketch(Plane(origin=(0, 0, 0), x_dir=(1, 0, 0), z_dir=(0, 1, 0)), mode=Mode.PRIVATE) as cut_extrude9_sk1:
        with Locations(Location((-195.8, -3.5, 0), (0, 0, 180))):
            Circle(SKETCH15_R)
    cut_extrude9_tool1 = extrude(cut_extrude9_sk1.sketch, amount=-CUT_EXTRUDE9_REACH, mode=Mode.PRIVATE) & part.part
    # Sketch15 → Cut-Extrude9 (cut, up to next)
    with BuildSketch(Plane(origin=(0, 0, 0), x_dir=(1, 0, 0), z_dir=(0, 1, 0)), mode=Mode.PRIVATE) as cut_extrude9_sk2:
        with Locations(Location((45.8, -3.5, 0), (0, 0, 180))):
            Circle(SKETCH15_R)
    cut_extrude9_tool2 = extrude(cut_extrude9_sk2.sketch, amount=-CUT_EXTRUDE9_REACH, mode=Mode.PRIVATE) & part.part
    add(cut_extrude9_tool1.solids().sort_by_distance((-195.8, 0, 3.5))[0], mode=Mode.SUBTRACT)
    add(cut_extrude9_tool2.solids().sort_by_distance((45.8, 0, 3.5))[0], mode=Mode.SUBTRACT)


solid = part.part
